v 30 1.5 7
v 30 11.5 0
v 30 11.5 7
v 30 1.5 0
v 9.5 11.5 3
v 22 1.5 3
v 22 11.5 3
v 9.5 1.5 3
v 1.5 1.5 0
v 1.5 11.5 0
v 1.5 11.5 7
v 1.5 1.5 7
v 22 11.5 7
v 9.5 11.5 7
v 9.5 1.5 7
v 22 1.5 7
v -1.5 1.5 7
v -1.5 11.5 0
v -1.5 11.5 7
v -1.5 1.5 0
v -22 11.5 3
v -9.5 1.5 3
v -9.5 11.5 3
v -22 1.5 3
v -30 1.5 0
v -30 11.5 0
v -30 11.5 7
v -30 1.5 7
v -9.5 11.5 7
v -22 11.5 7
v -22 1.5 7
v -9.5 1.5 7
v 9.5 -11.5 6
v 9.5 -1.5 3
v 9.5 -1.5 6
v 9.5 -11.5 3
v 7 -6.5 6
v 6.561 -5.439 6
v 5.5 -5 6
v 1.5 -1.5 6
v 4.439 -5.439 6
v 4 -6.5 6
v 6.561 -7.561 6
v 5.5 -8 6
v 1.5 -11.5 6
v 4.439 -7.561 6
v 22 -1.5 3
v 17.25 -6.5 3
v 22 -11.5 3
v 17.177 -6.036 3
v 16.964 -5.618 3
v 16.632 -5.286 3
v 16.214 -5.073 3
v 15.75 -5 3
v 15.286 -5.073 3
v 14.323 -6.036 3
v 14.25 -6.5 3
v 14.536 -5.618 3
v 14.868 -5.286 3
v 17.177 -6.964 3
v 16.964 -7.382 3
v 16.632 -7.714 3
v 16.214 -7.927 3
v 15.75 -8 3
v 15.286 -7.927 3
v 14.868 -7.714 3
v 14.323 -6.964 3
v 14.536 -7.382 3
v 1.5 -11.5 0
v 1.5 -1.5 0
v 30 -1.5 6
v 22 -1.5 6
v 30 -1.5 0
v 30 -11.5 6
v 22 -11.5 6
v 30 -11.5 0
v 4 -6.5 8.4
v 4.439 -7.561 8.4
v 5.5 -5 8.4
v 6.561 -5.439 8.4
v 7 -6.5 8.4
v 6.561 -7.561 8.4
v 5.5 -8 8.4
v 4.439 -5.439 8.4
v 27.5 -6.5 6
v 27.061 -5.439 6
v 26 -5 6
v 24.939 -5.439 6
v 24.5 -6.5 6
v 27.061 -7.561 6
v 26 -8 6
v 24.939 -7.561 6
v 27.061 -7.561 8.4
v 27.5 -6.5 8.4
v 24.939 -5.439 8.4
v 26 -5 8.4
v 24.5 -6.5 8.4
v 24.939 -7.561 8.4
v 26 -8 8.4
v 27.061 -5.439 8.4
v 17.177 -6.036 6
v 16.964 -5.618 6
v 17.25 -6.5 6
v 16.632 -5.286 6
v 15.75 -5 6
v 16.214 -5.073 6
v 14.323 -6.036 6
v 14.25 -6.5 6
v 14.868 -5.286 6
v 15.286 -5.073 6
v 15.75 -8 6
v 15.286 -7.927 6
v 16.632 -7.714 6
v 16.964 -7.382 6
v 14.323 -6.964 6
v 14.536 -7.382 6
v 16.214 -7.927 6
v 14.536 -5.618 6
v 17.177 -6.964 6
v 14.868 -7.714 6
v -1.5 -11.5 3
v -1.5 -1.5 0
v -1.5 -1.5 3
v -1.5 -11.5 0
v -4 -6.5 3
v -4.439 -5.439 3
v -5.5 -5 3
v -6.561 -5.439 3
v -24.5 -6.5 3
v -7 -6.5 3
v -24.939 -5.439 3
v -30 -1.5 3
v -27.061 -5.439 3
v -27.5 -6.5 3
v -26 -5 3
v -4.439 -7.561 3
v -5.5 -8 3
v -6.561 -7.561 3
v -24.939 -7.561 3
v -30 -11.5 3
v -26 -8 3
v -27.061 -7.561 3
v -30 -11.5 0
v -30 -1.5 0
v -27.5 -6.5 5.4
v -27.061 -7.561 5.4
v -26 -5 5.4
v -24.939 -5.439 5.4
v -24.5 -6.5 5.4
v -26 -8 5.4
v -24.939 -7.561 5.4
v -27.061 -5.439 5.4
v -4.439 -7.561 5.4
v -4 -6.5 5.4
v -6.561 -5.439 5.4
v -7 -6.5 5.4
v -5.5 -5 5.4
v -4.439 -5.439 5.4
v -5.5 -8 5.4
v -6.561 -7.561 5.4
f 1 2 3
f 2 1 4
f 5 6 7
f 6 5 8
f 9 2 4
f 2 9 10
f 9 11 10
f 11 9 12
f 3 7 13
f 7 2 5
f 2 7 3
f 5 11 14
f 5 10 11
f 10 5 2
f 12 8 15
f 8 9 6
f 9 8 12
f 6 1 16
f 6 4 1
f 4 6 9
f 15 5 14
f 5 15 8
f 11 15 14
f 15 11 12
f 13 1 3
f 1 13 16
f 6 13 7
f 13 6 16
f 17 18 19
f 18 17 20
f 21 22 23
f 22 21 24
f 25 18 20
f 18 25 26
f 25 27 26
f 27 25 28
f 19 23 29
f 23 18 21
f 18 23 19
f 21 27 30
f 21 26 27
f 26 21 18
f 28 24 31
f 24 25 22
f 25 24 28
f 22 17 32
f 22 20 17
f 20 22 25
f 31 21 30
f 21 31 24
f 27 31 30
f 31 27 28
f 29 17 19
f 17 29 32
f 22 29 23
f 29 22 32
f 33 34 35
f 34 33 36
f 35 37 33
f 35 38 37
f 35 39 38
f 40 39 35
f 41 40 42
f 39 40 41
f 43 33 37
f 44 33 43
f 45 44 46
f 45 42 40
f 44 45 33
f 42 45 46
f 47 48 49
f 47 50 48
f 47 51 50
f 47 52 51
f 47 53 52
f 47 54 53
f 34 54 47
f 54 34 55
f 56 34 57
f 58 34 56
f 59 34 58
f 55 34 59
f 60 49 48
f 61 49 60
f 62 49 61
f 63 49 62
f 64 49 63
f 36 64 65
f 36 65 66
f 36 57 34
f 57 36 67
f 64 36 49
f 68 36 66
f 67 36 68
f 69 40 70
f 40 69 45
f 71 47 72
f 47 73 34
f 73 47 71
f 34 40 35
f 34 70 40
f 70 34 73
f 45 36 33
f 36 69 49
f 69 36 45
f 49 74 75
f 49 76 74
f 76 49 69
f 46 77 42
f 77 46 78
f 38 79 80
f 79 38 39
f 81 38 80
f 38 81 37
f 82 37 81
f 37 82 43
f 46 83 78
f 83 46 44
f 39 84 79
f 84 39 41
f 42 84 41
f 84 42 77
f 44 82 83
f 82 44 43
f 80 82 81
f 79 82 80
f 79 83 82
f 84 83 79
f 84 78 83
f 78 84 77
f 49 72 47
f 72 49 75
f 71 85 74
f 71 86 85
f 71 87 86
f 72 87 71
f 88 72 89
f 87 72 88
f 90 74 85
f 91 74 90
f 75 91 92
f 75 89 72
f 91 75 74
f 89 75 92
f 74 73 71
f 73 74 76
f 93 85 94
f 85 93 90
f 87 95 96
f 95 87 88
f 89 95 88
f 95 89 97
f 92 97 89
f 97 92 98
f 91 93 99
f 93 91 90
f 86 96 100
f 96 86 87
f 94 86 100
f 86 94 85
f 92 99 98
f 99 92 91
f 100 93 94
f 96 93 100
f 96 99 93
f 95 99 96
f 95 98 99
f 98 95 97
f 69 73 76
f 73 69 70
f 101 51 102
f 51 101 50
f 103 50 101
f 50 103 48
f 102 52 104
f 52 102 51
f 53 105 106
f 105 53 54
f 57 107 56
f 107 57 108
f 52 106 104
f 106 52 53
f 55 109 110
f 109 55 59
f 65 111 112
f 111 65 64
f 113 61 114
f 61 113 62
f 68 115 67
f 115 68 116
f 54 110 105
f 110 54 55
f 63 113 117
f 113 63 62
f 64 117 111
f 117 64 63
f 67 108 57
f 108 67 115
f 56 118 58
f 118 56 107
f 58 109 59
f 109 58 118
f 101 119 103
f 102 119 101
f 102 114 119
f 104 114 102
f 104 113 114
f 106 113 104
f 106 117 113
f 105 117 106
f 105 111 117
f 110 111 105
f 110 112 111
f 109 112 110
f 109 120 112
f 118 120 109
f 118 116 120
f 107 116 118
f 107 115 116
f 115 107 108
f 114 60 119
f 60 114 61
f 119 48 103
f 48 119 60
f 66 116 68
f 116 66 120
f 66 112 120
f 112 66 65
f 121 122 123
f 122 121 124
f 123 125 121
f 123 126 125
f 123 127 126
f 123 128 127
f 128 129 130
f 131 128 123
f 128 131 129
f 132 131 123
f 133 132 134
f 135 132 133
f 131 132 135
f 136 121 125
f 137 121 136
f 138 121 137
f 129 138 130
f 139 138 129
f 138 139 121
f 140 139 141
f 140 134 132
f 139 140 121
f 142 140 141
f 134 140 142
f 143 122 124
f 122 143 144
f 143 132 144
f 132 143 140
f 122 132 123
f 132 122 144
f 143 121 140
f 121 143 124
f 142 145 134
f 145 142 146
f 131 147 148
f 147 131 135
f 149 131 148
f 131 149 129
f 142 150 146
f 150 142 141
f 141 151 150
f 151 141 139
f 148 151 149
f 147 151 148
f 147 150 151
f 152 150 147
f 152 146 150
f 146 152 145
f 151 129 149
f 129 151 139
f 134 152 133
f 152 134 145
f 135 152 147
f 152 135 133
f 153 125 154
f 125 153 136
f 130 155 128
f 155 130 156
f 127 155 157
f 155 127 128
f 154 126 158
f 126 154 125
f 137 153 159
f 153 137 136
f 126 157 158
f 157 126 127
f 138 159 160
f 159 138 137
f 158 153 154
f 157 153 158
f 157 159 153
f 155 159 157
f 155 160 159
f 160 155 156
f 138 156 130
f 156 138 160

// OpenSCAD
// file: clamp_common.scad
strip_width = 12.5;
strip_thickness = 4;

pad_width = 8;
length = 10;

base_width = strip_width + 2*pad_width;
base_length = length;
base_thickness = 3;
base_size = [base_width, base_length, base_thickness];

plate_thickness = 3;
plate_hole_radius = 1.5;

pin_radius_base = 1.5;
// file: back_top.scad
include <clamp_common.scad>;

module back_top() {

translate(v=[-base_width/2, -base_length/2, 0]) {
	cube(size=base_size);
}

module pin() {
	pin_height = base_thickness - 0.6; // 0.6mm spacing/tolerance
	pin_radius = pin_radius_base; // 3mm hole
	cylinder($fn=8, h=pin_height, r=pin_radius);
}


module left_pin() {
	translate(v=[-base_width/2+pad_width/2, 0, base_thickness]) {
		translate(v=[0, 0, plate_thickness/2]) {
			cube(size=[pad_width, base_length, plate_thickness], center=true);
		}
		translate(v=[0, 0, plate_thickness]) {pin();}
	}
}

left_pin();
mirror(v=[1,0,0]) {
	left_pin();
}

translate(v=[0, 0, base_thickness]) {
	cylinder($fn=20, h=plate_thickness, r=plate_hole_radius);
}

}
// file: back_bottom.scad
include <clamp_common.scad>;


module back_bottom() {

translate(v=[-base_width/2, -base_length/2, 0]) {
	cube(size=base_size);
}

module pin() {
	pin_height = base_thickness - 0.6; // 0.6mm spacing/tolerance
	pin_radius = pin_radius_base; // 3mm hole
	cylinder($fn=8, h=pin_height, r=pin_radius);
}


module left_pin() {
	translate(v=[-base_width/2+pad_width/2, 0, base_thickness]) {pin();}
}

left_pin();
mirror(v=[1,0,0]) {
	left_pin();
}

}
// file: front.scad
include <clamp_common.scad>;

module front() {

epsilon = 2;

translate(v=[-base_width/2, -base_length/2, 0]) {
	cube(size=base_size);
}

module pin() {
	pin_height = plate_thickness;
	pin_radius = pin_radius_base+0.3; // 3mm hole, plus tolerance
	cylinder($fn=8, h=pin_height+epsilon, r=pin_radius);
}


module left_pad() {
	translate(v=[-base_width/2+pad_width/2, 0, base_thickness]) {
		difference() {
			translate(v=[0, 0, strip_thickness/2]) {
				cube(size=[pad_width, base_length, strip_thickness], center=true);
			}
			%pin();
		}
	}
}

left_pad();
mirror(v=[1,0,0]) {
	left_pad();
}

}
// main file
include <front.scad>;
include <back_bottom.scad>;
include <back_top.scad>;

split = 3;

translate(v=[(base_width+split)/2, (base_length+split)/2, 0]) {front();}
translate(v=[-(base_width+split)/2, (base_length+split)/2, 0]) {front();}
translate(v=[(base_width+split)/2, -(base_length+split)/2, 0]) {back_top();}
translate(v=[-(base_width+split)/2, -(base_length+split)/2, 0]) {back_bottom();}
